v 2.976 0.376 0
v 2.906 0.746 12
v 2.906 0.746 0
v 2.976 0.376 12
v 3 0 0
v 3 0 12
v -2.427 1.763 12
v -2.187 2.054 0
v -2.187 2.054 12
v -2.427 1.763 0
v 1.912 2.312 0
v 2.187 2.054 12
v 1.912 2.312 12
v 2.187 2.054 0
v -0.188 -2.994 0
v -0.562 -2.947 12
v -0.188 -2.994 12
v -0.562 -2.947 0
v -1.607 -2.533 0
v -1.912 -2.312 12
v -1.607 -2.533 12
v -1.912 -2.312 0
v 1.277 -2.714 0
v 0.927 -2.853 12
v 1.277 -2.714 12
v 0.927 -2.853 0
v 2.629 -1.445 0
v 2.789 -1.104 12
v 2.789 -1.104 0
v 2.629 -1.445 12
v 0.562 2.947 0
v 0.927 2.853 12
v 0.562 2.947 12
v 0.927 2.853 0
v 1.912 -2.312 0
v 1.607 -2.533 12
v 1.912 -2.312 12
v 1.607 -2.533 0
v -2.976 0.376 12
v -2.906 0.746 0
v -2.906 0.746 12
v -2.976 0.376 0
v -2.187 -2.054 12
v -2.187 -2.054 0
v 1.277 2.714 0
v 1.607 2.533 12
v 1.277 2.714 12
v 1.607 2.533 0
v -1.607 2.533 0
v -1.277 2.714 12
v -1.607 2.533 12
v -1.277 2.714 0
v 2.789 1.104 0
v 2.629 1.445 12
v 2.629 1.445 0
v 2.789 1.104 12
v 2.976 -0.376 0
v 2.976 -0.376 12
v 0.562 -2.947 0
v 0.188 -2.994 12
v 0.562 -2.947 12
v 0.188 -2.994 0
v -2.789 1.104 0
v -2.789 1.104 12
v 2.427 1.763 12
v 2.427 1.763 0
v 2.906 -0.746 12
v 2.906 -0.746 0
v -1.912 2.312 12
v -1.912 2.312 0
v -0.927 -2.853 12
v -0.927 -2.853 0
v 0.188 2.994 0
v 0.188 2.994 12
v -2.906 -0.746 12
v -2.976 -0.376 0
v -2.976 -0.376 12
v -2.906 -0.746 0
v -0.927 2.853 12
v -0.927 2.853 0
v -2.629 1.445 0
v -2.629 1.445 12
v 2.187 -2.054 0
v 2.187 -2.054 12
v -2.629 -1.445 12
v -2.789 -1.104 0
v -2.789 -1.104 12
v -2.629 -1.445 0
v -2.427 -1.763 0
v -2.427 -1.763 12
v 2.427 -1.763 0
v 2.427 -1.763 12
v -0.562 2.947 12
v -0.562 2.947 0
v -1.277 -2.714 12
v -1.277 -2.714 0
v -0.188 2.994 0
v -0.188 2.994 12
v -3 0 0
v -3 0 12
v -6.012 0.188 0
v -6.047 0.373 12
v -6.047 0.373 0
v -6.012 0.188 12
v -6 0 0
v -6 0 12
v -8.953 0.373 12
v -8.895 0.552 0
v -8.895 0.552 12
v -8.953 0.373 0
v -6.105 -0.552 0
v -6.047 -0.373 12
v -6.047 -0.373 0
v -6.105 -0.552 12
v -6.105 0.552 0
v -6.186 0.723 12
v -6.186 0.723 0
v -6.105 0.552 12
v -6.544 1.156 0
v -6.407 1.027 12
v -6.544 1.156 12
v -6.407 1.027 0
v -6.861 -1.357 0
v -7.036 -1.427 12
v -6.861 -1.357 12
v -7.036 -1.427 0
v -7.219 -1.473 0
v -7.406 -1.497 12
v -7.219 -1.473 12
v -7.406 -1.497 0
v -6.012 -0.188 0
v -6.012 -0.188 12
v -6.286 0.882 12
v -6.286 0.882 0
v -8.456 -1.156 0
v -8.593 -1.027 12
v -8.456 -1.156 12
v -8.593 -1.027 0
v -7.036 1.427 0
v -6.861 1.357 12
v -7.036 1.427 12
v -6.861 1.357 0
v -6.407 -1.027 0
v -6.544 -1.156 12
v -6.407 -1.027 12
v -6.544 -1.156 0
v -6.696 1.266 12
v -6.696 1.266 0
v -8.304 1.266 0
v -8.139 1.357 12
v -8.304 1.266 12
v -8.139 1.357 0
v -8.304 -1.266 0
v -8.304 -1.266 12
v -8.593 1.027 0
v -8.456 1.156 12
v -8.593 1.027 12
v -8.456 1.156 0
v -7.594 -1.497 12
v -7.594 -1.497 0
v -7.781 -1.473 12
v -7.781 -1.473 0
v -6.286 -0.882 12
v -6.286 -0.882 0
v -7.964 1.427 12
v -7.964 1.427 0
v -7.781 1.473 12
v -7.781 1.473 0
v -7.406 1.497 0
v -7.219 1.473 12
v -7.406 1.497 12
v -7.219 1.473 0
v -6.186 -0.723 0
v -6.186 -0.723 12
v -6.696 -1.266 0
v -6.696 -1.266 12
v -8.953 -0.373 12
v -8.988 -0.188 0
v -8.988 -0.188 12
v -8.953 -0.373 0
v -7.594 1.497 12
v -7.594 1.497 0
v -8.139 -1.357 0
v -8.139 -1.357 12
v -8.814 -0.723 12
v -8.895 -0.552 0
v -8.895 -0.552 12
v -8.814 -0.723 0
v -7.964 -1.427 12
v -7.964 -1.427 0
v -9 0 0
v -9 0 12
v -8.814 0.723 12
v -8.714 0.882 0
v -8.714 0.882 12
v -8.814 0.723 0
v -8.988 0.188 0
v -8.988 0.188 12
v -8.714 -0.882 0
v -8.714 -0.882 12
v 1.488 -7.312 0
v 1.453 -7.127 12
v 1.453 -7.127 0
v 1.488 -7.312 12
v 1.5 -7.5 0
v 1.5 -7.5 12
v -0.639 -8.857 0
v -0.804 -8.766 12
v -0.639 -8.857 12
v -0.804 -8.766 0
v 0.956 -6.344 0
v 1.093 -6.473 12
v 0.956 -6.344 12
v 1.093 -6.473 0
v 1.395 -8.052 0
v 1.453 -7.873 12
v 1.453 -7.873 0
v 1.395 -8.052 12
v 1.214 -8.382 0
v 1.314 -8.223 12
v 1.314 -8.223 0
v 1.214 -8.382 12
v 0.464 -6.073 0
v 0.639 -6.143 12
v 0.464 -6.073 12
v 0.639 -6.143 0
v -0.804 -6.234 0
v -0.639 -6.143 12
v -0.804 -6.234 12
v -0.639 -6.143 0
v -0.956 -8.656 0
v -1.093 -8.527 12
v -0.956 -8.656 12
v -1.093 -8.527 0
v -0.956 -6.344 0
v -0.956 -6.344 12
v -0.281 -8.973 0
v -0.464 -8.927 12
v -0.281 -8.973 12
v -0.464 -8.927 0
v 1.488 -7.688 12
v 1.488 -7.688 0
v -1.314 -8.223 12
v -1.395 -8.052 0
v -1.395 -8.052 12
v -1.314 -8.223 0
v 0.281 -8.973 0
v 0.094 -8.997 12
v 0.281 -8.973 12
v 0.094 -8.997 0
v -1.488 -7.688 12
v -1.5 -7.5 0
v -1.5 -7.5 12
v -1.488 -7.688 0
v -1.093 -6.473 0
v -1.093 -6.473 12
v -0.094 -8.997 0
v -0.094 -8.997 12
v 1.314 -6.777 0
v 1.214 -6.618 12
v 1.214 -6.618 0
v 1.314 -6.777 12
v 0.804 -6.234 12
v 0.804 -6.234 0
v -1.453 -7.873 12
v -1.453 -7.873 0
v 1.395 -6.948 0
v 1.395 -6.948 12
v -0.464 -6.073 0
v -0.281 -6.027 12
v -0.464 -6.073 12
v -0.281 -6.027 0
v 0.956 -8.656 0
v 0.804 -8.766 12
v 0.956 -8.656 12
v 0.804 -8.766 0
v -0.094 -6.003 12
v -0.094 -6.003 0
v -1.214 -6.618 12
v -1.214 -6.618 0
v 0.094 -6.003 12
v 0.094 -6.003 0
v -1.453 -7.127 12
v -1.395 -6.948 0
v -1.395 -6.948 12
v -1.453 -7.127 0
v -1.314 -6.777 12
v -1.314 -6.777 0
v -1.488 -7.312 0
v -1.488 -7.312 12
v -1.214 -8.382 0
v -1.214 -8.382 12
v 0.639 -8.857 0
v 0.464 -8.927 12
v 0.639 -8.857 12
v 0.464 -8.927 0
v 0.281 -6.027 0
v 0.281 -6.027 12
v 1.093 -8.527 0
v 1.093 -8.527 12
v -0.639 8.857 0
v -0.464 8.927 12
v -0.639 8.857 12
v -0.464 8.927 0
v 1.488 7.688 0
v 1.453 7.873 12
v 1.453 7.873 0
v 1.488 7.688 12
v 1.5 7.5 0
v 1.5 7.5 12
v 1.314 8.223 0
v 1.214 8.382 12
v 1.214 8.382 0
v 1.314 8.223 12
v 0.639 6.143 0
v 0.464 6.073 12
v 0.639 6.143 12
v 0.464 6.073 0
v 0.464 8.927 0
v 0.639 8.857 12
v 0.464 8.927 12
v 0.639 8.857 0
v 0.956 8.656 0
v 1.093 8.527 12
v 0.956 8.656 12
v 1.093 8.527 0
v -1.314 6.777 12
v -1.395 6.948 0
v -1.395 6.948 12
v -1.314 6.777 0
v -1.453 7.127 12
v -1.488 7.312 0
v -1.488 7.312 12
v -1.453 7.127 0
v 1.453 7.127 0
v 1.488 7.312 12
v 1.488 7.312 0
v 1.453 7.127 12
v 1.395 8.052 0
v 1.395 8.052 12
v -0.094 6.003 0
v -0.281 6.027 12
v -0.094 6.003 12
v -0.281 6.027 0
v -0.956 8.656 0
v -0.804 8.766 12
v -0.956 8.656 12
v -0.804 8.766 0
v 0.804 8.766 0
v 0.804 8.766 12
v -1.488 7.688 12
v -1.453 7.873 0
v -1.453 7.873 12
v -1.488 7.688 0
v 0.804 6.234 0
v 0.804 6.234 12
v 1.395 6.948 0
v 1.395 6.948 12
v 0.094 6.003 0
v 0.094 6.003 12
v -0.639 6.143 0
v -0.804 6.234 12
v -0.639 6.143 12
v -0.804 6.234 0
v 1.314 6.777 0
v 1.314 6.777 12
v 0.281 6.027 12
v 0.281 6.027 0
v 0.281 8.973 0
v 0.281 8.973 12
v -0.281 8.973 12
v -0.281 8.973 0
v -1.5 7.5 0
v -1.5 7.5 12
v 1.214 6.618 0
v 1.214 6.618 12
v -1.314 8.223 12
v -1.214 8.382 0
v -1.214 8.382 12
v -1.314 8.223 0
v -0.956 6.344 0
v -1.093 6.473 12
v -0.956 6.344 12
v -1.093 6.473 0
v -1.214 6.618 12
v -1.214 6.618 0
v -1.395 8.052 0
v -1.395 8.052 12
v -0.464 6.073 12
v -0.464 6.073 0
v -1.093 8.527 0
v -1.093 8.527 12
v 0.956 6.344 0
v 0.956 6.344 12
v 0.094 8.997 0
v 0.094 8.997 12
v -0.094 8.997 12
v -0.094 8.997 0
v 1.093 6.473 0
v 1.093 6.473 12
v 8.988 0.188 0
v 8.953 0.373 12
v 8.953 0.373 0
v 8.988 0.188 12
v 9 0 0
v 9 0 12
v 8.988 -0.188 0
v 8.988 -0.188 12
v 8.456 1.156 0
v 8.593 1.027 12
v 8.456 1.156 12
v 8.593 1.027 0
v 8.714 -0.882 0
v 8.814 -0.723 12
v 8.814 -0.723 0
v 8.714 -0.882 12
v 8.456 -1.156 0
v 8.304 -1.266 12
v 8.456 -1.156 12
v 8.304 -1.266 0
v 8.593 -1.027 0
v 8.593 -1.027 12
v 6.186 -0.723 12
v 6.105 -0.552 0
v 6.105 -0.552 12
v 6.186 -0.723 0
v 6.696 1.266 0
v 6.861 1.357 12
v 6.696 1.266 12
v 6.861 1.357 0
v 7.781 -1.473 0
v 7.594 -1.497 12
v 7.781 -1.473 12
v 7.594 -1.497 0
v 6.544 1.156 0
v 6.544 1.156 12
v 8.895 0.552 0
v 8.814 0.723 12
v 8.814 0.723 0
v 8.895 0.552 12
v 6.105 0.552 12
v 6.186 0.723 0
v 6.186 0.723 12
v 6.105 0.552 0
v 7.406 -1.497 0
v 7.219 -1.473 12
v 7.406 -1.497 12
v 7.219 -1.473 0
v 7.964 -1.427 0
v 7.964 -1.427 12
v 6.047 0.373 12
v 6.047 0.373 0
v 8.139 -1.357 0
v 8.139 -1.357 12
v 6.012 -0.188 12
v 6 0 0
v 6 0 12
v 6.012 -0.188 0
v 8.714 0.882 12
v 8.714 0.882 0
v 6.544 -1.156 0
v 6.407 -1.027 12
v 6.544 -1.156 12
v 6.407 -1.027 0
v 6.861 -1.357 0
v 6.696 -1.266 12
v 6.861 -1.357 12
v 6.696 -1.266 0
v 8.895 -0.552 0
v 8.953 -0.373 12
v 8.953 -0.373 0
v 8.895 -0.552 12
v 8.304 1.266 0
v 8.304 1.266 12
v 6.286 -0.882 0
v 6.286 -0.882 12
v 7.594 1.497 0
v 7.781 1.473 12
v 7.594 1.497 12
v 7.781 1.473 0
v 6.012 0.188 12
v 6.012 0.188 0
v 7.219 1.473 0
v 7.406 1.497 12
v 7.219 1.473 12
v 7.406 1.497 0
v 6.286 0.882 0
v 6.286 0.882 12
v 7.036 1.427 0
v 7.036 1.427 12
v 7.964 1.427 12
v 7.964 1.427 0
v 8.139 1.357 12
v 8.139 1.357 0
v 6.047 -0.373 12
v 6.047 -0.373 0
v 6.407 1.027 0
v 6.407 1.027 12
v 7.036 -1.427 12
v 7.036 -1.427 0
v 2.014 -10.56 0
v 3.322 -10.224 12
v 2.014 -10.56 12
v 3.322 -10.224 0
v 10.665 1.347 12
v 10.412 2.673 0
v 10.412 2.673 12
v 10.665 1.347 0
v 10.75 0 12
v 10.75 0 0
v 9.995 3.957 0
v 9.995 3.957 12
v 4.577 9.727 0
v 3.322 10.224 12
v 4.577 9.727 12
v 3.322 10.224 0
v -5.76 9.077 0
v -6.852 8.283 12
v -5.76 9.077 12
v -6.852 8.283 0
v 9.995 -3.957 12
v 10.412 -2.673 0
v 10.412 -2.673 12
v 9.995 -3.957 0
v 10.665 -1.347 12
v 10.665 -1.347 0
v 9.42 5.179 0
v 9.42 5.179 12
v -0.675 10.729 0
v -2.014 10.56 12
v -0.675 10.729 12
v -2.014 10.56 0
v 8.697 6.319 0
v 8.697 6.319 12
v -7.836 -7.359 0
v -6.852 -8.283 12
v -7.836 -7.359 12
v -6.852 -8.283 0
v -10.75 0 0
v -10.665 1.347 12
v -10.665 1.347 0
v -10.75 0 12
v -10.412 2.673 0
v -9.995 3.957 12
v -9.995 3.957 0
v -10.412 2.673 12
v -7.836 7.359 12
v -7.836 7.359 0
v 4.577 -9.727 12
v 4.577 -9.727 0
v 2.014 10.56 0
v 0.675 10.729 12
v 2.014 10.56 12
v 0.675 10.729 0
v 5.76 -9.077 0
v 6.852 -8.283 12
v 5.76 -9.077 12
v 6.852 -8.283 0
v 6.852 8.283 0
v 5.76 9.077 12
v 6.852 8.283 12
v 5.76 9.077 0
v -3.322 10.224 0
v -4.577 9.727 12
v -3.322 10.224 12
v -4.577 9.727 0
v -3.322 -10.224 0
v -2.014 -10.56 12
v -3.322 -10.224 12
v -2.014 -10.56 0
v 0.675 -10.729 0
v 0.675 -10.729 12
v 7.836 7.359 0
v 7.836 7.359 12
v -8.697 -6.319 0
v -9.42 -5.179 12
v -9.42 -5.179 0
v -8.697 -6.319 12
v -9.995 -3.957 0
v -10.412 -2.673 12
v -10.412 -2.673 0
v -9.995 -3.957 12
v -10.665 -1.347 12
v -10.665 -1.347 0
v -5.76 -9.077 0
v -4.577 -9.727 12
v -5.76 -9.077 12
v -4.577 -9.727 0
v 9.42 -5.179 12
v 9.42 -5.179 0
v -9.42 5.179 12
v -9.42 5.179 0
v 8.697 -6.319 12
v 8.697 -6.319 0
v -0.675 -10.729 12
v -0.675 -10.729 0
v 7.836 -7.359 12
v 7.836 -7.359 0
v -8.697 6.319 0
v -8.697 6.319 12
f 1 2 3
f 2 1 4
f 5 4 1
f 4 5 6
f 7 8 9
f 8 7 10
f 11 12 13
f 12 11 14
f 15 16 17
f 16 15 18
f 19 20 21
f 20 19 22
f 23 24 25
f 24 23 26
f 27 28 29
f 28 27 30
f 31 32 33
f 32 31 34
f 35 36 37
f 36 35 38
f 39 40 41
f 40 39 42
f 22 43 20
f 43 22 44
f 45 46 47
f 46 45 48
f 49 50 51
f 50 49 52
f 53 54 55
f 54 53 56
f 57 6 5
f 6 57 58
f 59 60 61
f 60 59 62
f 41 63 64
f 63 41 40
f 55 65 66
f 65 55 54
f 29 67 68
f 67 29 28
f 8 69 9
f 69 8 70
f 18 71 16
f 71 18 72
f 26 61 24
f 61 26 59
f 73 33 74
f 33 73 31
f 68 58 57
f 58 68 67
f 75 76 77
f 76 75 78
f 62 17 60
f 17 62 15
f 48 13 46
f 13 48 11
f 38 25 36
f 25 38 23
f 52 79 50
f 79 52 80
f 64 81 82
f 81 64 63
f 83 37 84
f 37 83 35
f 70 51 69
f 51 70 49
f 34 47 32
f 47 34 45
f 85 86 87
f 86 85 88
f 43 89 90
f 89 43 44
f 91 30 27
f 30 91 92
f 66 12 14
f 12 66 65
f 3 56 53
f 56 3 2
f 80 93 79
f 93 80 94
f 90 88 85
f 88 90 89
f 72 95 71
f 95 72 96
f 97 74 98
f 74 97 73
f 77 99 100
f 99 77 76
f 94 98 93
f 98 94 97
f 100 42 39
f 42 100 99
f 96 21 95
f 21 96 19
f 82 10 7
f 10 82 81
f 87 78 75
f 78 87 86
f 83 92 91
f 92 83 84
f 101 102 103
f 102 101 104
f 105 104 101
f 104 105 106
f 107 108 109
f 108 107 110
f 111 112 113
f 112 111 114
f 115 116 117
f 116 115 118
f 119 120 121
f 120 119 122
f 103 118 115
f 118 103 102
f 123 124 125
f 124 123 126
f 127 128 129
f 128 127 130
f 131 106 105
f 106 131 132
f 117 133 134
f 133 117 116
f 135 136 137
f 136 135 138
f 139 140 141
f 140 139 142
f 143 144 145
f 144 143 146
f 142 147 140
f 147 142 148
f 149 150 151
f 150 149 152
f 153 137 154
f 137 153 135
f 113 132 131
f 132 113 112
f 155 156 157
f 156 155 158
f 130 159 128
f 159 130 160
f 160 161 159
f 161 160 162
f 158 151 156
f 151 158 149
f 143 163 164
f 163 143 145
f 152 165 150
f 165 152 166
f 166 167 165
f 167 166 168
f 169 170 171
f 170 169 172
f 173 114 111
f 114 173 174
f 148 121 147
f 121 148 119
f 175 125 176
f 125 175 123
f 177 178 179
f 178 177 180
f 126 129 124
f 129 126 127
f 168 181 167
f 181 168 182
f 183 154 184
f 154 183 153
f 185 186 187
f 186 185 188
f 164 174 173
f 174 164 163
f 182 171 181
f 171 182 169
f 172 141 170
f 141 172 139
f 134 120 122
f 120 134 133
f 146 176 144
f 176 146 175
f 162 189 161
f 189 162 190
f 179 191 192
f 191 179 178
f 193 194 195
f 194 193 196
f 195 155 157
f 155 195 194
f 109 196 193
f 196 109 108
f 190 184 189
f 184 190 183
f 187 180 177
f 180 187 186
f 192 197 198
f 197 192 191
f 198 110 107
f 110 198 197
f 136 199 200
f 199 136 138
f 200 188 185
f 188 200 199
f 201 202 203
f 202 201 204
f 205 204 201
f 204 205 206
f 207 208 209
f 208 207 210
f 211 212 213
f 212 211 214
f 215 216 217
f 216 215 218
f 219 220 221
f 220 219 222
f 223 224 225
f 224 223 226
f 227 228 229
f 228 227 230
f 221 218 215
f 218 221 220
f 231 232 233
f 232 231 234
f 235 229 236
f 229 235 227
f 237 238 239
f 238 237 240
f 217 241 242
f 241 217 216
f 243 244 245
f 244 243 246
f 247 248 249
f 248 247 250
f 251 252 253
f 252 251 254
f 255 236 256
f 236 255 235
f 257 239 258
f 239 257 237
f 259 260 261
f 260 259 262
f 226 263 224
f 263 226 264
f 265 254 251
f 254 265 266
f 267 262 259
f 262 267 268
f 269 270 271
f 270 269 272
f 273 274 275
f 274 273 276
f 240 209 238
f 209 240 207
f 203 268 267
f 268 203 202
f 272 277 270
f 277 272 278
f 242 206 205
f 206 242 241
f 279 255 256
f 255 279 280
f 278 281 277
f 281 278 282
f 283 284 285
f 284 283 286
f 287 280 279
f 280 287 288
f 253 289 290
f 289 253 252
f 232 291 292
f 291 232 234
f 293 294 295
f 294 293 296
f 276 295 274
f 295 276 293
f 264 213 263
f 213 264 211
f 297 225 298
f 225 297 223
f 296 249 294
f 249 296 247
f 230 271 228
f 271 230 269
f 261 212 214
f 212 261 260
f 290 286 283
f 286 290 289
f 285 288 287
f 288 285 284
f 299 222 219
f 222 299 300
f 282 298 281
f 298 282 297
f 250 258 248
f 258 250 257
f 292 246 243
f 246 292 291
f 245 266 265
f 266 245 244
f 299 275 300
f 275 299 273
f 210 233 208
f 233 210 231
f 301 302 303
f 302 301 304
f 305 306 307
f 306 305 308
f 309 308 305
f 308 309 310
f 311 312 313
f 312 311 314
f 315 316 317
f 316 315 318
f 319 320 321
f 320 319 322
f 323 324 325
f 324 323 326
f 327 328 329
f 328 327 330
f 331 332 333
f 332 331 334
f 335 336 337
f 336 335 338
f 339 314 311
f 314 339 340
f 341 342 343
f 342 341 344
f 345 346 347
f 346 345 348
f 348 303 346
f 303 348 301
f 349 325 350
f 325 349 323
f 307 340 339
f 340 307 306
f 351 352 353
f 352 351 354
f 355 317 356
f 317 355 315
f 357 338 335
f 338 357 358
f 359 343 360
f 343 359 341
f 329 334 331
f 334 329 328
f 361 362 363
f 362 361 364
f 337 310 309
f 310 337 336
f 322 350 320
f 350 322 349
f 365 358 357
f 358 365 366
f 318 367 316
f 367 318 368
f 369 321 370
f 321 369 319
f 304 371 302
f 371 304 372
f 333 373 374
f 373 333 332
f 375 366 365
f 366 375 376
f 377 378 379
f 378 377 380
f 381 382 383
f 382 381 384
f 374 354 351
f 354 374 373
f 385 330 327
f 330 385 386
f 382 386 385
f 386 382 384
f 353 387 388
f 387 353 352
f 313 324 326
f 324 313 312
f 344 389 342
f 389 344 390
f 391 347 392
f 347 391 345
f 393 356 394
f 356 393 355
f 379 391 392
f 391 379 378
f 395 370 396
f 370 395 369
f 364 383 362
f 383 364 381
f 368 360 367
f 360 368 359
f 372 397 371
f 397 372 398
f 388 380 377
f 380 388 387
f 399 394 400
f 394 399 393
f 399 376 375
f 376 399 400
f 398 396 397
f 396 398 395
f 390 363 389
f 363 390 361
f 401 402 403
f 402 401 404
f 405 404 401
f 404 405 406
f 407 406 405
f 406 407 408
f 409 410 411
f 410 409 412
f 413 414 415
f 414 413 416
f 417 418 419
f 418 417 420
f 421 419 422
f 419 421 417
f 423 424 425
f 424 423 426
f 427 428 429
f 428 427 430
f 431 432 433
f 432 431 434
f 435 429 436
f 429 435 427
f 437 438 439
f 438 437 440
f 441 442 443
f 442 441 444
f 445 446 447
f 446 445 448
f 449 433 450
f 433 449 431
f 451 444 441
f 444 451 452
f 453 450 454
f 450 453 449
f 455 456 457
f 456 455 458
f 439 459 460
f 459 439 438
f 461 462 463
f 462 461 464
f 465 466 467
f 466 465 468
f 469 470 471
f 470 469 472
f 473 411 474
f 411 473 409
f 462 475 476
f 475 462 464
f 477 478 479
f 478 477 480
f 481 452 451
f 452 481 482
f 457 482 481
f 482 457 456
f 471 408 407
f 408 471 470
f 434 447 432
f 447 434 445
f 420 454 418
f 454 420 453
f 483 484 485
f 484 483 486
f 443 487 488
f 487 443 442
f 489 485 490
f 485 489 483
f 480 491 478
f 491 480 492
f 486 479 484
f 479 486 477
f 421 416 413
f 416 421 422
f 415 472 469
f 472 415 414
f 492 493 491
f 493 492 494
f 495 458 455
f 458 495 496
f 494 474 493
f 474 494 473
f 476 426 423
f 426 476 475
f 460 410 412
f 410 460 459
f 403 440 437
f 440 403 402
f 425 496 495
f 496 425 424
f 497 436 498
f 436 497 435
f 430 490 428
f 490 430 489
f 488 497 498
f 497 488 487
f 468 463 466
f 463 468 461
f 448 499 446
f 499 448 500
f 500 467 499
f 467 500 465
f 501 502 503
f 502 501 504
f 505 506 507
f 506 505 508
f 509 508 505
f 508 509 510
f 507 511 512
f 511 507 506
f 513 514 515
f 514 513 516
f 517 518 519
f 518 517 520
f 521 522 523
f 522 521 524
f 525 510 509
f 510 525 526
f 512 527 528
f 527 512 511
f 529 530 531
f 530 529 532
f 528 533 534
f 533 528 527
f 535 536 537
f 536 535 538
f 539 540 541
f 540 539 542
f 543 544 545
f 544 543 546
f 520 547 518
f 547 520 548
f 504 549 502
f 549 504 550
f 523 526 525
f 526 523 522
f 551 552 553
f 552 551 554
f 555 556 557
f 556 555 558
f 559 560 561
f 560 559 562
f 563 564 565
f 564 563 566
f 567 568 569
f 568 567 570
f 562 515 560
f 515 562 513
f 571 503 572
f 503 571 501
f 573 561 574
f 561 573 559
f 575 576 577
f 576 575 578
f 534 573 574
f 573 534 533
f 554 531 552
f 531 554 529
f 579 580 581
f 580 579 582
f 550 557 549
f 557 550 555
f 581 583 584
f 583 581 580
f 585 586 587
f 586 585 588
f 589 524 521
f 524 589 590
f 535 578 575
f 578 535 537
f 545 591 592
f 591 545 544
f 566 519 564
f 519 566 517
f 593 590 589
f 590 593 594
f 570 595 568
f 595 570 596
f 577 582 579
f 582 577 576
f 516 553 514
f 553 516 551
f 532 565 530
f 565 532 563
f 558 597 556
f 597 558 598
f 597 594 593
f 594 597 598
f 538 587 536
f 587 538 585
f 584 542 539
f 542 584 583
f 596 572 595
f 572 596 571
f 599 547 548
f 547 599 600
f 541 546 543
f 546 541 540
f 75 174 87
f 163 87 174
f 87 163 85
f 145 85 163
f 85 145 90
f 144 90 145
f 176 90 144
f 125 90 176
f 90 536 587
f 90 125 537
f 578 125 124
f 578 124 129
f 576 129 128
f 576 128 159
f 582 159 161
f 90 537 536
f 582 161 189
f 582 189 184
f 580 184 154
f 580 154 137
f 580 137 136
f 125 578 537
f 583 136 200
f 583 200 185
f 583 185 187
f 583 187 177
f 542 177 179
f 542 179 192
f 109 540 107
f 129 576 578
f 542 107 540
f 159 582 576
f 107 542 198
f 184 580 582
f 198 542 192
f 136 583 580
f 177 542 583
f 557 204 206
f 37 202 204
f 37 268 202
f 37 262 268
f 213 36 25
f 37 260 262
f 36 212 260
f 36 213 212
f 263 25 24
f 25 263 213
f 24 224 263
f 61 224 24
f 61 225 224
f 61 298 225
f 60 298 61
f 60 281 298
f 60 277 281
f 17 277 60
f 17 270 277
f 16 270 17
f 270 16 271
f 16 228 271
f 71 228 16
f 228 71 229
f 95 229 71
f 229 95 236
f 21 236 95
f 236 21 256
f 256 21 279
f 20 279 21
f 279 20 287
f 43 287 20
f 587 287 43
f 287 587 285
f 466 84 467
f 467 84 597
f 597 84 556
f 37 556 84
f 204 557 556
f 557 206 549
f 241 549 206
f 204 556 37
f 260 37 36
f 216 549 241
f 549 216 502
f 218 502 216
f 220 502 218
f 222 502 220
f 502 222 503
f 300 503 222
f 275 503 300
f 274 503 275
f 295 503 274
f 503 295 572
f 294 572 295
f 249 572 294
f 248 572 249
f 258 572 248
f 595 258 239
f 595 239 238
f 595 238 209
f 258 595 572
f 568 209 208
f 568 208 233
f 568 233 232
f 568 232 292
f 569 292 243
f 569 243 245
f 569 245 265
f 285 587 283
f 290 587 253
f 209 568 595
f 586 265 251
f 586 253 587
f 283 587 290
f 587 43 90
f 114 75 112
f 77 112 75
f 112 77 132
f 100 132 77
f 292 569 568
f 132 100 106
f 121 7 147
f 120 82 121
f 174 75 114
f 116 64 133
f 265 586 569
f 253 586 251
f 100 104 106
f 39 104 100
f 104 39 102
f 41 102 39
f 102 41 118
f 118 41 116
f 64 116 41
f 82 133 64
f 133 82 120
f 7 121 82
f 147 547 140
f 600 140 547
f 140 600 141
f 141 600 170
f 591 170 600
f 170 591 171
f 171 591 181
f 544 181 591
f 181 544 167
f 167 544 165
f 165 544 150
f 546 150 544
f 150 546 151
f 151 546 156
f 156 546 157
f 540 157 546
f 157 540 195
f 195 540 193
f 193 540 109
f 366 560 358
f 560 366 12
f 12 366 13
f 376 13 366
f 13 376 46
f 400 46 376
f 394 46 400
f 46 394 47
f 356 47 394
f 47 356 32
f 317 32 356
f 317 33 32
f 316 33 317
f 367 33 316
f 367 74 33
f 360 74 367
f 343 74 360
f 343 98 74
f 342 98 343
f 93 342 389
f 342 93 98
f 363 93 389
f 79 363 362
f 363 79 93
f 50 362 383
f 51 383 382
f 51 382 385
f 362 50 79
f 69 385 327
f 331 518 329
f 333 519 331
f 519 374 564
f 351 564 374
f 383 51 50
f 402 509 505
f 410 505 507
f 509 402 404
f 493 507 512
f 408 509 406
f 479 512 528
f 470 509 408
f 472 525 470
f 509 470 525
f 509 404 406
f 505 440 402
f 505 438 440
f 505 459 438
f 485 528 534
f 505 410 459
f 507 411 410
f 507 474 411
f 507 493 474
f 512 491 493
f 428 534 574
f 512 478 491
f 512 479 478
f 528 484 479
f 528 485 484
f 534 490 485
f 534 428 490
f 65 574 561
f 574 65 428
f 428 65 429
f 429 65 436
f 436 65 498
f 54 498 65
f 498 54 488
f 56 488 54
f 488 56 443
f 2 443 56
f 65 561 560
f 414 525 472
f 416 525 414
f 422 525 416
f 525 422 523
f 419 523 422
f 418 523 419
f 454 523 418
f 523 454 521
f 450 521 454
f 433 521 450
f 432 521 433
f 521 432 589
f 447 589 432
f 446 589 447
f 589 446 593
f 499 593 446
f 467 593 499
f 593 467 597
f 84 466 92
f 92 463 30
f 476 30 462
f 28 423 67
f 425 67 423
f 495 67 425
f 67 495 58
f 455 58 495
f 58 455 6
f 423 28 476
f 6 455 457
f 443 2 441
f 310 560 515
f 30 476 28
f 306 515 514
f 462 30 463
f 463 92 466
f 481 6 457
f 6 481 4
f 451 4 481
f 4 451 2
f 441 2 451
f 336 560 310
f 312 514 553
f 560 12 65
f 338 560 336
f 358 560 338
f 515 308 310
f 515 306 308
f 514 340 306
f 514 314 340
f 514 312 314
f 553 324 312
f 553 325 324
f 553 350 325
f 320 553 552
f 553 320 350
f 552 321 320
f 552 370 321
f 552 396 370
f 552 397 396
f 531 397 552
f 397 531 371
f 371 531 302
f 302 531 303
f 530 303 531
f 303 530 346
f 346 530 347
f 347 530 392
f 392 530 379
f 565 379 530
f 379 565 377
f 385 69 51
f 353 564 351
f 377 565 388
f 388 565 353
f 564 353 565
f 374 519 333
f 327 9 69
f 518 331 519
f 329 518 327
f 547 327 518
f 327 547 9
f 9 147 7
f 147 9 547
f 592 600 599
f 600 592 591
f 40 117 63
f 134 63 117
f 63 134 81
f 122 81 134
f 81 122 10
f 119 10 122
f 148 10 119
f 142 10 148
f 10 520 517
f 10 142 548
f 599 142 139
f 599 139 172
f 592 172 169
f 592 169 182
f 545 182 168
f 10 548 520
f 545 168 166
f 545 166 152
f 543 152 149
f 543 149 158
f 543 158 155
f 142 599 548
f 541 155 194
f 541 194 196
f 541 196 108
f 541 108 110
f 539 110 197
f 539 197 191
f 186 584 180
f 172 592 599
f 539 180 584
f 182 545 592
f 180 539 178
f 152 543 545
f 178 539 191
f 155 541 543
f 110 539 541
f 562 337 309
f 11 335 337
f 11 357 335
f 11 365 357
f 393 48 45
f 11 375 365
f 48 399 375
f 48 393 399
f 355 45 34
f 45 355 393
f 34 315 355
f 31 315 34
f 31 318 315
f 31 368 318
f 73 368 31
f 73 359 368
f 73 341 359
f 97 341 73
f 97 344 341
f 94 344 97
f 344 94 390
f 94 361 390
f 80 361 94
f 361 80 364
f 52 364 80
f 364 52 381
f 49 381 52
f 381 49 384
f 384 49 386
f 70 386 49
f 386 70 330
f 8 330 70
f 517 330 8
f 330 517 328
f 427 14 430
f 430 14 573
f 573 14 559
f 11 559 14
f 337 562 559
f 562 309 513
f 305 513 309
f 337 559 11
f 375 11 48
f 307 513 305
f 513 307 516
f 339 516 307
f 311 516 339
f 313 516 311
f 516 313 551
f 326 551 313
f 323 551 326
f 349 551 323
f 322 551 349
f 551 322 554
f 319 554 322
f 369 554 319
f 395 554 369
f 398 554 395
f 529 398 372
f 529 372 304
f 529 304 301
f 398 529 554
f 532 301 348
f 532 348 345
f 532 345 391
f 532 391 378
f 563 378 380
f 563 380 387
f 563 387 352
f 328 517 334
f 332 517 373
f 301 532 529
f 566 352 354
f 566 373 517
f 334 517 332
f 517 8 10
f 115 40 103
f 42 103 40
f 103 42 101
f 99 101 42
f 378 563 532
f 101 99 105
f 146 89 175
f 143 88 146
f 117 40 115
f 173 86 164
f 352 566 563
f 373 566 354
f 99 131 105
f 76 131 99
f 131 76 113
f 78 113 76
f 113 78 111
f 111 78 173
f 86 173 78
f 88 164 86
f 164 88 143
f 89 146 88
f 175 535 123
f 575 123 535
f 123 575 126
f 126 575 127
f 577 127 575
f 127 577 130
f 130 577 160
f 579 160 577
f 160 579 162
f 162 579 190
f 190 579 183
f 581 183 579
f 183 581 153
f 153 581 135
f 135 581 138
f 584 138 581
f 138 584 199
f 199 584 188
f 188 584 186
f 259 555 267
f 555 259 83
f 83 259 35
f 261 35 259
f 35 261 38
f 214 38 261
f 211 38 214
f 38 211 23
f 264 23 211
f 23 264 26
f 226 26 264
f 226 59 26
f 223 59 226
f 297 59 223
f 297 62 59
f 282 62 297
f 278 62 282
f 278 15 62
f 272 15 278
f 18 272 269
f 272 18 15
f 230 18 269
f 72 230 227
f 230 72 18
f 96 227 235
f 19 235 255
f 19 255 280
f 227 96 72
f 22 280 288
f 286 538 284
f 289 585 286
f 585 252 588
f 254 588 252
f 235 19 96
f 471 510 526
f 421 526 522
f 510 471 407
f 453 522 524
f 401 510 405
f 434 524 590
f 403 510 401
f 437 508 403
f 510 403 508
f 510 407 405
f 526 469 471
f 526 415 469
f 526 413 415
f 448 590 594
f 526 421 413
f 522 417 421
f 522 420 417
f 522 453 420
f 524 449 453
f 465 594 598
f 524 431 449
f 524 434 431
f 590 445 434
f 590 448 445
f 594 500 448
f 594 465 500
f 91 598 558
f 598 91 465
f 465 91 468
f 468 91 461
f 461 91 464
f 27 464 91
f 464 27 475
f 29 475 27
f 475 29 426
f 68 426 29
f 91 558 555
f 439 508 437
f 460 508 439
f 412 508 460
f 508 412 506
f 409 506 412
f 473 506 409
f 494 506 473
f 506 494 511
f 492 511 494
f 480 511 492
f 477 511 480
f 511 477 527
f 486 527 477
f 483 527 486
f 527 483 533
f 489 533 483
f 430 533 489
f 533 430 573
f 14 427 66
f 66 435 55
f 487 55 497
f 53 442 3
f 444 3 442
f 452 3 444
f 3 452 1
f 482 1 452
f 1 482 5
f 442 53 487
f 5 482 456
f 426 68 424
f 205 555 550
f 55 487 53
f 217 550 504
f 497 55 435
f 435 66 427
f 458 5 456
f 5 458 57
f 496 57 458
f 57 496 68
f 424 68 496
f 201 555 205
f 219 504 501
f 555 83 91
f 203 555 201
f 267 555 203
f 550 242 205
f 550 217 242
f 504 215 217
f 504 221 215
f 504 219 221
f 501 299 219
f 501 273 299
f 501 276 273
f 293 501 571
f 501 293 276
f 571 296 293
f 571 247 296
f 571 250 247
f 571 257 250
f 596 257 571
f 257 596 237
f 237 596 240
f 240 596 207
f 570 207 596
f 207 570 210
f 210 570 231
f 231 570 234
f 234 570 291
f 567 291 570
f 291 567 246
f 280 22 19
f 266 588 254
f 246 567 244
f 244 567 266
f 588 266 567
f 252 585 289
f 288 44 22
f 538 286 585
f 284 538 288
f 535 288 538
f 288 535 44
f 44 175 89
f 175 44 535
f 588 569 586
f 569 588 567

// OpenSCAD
$fn = 50;


difference() {
	union() {
		*color(alpha = 1.0000000000, c = "gray") {
			translate(v = [0, 7, 0]) {
				linear_extrude(height = 1) {
					text(font = "Arial:style=Bold", halign = "center", size = 4.5000000000, text = "COMMENT circle main", valign = "center");
				}
			}
		}
		*color(alpha = 1.0000000000, c = "gray") {
			translate(v = [0, 14, 0]) {
				linear_extrude(height = 1.5000000000) {
					text(font = "Arial:style=Bold", halign = "center", size = 4.5000000000, text = "COMMENT description oobb_circle_shape_p_type_12_depth_1.5_diameter_12_thickness_1.5_width_1.5_height", valign = "center");
				}
			}
		}
		cylinder(h = 12, r = 10.7500000000);
	}
	union() {
		*color(alpha = 1.0000000000, c = "gray") {
			translate(v = [0, 7, 0]) {
				linear_extrude(height = 1) {
					text(font = "Arial:style=Bold", halign = "center", size = 4.5000000000, text = "COMMENT holes main", valign = "center");
				}
			}
		}
		*color(alpha = 1.0000000000, c = "gray") {
			translate(v = [0, 14, 0]) {
				linear_extrude(height = 1.5000000000) {
					text(font = "Arial:style=Bold", halign = "center", size = 4.5000000000, text = "COMMENT description oobb_holes_shape_n_type_1.5_diameter_12_thickness_1.5_width_1.5_height_true_both_holes_true_circle", valign = "center");
				}
			}
		}
		translate(v = [0.0000000000, 0.0000000000, -50.0000000000]) {
			cylinder(h = 100, r = 3.0000000000);
		}
		translate(v = [0.0000000000, 0.0000000000, -50.0000000000]) {
			cylinder(h = 100, r = 3.0000000000);
		}
		translate(v = [0.0000000000, 0.0000000000, -50.0000000000]) {
			cylinder(h = 100, r = 3.0000000000);
		}
		translate(v = [-7.5000000000, 0.0000000000, -50.0000000000]) {
			cylinder(h = 100, r = 1.5000000000);
		}
		translate(v = [0.0000000000, -7.5000000000, -50.0000000000]) {
			cylinder(h = 100, r = 1.5000000000);
		}
		translate(v = [0.0000000000, 0.0000000000, -50.0000000000]) {
			cylinder(h = 100, r = 1.5000000000);
		}
		translate(v = [0.0000000000, 7.5000000000, -50.0000000000]) {
			cylinder(h = 100, r = 1.5000000000);
		}
		translate(v = [7.5000000000, 0.0000000000, -50.0000000000]) {
			cylinder(h = 100, r = 1.5000000000);
		}
		translate(v = [-7.5000000000, 0.0000000000, -50.0000000000]) {
			cylinder(h = 100, r = 1.5000000000);
		}
		translate(v = [0.0000000000, -7.5000000000, -50.0000000000]) {
			cylinder(h = 100, r = 1.5000000000);
		}
		translate(v = [0.0000000000, 0.0000000000, -50.0000000000]) {
			cylinder(h = 100, r = 1.5000000000);
		}
		translate(v = [0.0000000000, 7.5000000000, -50.0000000000]) {
			cylinder(h = 100, r = 1.5000000000);
		}
		translate(v = [7.5000000000, 0.0000000000, -50.0000000000]) {
			cylinder(h = 100, r = 1.5000000000);
		}
		translate(v = [-7.5000000000, 0.0000000000, -50.0000000000]) {
			cylinder(h = 100, r = 1.5000000000);
		}
		translate(v = [0.0000000000, -7.5000000000, -50.0000000000]) {
			cylinder(h = 100, r = 1.5000000000);
		}
		translate(v = [0.0000000000, 0.0000000000, -50.0000000000]) {
			cylinder(h = 100, r = 1.5000000000);
		}
		translate(v = [0.0000000000, 7.5000000000, -50.0000000000]) {
			cylinder(h = 100, r = 1.5000000000);
		}
		translate(v = [7.5000000000, 0.0000000000, -50.0000000000]) {
			cylinder(h = 100, r = 1.5000000000);
		}
	}
}
